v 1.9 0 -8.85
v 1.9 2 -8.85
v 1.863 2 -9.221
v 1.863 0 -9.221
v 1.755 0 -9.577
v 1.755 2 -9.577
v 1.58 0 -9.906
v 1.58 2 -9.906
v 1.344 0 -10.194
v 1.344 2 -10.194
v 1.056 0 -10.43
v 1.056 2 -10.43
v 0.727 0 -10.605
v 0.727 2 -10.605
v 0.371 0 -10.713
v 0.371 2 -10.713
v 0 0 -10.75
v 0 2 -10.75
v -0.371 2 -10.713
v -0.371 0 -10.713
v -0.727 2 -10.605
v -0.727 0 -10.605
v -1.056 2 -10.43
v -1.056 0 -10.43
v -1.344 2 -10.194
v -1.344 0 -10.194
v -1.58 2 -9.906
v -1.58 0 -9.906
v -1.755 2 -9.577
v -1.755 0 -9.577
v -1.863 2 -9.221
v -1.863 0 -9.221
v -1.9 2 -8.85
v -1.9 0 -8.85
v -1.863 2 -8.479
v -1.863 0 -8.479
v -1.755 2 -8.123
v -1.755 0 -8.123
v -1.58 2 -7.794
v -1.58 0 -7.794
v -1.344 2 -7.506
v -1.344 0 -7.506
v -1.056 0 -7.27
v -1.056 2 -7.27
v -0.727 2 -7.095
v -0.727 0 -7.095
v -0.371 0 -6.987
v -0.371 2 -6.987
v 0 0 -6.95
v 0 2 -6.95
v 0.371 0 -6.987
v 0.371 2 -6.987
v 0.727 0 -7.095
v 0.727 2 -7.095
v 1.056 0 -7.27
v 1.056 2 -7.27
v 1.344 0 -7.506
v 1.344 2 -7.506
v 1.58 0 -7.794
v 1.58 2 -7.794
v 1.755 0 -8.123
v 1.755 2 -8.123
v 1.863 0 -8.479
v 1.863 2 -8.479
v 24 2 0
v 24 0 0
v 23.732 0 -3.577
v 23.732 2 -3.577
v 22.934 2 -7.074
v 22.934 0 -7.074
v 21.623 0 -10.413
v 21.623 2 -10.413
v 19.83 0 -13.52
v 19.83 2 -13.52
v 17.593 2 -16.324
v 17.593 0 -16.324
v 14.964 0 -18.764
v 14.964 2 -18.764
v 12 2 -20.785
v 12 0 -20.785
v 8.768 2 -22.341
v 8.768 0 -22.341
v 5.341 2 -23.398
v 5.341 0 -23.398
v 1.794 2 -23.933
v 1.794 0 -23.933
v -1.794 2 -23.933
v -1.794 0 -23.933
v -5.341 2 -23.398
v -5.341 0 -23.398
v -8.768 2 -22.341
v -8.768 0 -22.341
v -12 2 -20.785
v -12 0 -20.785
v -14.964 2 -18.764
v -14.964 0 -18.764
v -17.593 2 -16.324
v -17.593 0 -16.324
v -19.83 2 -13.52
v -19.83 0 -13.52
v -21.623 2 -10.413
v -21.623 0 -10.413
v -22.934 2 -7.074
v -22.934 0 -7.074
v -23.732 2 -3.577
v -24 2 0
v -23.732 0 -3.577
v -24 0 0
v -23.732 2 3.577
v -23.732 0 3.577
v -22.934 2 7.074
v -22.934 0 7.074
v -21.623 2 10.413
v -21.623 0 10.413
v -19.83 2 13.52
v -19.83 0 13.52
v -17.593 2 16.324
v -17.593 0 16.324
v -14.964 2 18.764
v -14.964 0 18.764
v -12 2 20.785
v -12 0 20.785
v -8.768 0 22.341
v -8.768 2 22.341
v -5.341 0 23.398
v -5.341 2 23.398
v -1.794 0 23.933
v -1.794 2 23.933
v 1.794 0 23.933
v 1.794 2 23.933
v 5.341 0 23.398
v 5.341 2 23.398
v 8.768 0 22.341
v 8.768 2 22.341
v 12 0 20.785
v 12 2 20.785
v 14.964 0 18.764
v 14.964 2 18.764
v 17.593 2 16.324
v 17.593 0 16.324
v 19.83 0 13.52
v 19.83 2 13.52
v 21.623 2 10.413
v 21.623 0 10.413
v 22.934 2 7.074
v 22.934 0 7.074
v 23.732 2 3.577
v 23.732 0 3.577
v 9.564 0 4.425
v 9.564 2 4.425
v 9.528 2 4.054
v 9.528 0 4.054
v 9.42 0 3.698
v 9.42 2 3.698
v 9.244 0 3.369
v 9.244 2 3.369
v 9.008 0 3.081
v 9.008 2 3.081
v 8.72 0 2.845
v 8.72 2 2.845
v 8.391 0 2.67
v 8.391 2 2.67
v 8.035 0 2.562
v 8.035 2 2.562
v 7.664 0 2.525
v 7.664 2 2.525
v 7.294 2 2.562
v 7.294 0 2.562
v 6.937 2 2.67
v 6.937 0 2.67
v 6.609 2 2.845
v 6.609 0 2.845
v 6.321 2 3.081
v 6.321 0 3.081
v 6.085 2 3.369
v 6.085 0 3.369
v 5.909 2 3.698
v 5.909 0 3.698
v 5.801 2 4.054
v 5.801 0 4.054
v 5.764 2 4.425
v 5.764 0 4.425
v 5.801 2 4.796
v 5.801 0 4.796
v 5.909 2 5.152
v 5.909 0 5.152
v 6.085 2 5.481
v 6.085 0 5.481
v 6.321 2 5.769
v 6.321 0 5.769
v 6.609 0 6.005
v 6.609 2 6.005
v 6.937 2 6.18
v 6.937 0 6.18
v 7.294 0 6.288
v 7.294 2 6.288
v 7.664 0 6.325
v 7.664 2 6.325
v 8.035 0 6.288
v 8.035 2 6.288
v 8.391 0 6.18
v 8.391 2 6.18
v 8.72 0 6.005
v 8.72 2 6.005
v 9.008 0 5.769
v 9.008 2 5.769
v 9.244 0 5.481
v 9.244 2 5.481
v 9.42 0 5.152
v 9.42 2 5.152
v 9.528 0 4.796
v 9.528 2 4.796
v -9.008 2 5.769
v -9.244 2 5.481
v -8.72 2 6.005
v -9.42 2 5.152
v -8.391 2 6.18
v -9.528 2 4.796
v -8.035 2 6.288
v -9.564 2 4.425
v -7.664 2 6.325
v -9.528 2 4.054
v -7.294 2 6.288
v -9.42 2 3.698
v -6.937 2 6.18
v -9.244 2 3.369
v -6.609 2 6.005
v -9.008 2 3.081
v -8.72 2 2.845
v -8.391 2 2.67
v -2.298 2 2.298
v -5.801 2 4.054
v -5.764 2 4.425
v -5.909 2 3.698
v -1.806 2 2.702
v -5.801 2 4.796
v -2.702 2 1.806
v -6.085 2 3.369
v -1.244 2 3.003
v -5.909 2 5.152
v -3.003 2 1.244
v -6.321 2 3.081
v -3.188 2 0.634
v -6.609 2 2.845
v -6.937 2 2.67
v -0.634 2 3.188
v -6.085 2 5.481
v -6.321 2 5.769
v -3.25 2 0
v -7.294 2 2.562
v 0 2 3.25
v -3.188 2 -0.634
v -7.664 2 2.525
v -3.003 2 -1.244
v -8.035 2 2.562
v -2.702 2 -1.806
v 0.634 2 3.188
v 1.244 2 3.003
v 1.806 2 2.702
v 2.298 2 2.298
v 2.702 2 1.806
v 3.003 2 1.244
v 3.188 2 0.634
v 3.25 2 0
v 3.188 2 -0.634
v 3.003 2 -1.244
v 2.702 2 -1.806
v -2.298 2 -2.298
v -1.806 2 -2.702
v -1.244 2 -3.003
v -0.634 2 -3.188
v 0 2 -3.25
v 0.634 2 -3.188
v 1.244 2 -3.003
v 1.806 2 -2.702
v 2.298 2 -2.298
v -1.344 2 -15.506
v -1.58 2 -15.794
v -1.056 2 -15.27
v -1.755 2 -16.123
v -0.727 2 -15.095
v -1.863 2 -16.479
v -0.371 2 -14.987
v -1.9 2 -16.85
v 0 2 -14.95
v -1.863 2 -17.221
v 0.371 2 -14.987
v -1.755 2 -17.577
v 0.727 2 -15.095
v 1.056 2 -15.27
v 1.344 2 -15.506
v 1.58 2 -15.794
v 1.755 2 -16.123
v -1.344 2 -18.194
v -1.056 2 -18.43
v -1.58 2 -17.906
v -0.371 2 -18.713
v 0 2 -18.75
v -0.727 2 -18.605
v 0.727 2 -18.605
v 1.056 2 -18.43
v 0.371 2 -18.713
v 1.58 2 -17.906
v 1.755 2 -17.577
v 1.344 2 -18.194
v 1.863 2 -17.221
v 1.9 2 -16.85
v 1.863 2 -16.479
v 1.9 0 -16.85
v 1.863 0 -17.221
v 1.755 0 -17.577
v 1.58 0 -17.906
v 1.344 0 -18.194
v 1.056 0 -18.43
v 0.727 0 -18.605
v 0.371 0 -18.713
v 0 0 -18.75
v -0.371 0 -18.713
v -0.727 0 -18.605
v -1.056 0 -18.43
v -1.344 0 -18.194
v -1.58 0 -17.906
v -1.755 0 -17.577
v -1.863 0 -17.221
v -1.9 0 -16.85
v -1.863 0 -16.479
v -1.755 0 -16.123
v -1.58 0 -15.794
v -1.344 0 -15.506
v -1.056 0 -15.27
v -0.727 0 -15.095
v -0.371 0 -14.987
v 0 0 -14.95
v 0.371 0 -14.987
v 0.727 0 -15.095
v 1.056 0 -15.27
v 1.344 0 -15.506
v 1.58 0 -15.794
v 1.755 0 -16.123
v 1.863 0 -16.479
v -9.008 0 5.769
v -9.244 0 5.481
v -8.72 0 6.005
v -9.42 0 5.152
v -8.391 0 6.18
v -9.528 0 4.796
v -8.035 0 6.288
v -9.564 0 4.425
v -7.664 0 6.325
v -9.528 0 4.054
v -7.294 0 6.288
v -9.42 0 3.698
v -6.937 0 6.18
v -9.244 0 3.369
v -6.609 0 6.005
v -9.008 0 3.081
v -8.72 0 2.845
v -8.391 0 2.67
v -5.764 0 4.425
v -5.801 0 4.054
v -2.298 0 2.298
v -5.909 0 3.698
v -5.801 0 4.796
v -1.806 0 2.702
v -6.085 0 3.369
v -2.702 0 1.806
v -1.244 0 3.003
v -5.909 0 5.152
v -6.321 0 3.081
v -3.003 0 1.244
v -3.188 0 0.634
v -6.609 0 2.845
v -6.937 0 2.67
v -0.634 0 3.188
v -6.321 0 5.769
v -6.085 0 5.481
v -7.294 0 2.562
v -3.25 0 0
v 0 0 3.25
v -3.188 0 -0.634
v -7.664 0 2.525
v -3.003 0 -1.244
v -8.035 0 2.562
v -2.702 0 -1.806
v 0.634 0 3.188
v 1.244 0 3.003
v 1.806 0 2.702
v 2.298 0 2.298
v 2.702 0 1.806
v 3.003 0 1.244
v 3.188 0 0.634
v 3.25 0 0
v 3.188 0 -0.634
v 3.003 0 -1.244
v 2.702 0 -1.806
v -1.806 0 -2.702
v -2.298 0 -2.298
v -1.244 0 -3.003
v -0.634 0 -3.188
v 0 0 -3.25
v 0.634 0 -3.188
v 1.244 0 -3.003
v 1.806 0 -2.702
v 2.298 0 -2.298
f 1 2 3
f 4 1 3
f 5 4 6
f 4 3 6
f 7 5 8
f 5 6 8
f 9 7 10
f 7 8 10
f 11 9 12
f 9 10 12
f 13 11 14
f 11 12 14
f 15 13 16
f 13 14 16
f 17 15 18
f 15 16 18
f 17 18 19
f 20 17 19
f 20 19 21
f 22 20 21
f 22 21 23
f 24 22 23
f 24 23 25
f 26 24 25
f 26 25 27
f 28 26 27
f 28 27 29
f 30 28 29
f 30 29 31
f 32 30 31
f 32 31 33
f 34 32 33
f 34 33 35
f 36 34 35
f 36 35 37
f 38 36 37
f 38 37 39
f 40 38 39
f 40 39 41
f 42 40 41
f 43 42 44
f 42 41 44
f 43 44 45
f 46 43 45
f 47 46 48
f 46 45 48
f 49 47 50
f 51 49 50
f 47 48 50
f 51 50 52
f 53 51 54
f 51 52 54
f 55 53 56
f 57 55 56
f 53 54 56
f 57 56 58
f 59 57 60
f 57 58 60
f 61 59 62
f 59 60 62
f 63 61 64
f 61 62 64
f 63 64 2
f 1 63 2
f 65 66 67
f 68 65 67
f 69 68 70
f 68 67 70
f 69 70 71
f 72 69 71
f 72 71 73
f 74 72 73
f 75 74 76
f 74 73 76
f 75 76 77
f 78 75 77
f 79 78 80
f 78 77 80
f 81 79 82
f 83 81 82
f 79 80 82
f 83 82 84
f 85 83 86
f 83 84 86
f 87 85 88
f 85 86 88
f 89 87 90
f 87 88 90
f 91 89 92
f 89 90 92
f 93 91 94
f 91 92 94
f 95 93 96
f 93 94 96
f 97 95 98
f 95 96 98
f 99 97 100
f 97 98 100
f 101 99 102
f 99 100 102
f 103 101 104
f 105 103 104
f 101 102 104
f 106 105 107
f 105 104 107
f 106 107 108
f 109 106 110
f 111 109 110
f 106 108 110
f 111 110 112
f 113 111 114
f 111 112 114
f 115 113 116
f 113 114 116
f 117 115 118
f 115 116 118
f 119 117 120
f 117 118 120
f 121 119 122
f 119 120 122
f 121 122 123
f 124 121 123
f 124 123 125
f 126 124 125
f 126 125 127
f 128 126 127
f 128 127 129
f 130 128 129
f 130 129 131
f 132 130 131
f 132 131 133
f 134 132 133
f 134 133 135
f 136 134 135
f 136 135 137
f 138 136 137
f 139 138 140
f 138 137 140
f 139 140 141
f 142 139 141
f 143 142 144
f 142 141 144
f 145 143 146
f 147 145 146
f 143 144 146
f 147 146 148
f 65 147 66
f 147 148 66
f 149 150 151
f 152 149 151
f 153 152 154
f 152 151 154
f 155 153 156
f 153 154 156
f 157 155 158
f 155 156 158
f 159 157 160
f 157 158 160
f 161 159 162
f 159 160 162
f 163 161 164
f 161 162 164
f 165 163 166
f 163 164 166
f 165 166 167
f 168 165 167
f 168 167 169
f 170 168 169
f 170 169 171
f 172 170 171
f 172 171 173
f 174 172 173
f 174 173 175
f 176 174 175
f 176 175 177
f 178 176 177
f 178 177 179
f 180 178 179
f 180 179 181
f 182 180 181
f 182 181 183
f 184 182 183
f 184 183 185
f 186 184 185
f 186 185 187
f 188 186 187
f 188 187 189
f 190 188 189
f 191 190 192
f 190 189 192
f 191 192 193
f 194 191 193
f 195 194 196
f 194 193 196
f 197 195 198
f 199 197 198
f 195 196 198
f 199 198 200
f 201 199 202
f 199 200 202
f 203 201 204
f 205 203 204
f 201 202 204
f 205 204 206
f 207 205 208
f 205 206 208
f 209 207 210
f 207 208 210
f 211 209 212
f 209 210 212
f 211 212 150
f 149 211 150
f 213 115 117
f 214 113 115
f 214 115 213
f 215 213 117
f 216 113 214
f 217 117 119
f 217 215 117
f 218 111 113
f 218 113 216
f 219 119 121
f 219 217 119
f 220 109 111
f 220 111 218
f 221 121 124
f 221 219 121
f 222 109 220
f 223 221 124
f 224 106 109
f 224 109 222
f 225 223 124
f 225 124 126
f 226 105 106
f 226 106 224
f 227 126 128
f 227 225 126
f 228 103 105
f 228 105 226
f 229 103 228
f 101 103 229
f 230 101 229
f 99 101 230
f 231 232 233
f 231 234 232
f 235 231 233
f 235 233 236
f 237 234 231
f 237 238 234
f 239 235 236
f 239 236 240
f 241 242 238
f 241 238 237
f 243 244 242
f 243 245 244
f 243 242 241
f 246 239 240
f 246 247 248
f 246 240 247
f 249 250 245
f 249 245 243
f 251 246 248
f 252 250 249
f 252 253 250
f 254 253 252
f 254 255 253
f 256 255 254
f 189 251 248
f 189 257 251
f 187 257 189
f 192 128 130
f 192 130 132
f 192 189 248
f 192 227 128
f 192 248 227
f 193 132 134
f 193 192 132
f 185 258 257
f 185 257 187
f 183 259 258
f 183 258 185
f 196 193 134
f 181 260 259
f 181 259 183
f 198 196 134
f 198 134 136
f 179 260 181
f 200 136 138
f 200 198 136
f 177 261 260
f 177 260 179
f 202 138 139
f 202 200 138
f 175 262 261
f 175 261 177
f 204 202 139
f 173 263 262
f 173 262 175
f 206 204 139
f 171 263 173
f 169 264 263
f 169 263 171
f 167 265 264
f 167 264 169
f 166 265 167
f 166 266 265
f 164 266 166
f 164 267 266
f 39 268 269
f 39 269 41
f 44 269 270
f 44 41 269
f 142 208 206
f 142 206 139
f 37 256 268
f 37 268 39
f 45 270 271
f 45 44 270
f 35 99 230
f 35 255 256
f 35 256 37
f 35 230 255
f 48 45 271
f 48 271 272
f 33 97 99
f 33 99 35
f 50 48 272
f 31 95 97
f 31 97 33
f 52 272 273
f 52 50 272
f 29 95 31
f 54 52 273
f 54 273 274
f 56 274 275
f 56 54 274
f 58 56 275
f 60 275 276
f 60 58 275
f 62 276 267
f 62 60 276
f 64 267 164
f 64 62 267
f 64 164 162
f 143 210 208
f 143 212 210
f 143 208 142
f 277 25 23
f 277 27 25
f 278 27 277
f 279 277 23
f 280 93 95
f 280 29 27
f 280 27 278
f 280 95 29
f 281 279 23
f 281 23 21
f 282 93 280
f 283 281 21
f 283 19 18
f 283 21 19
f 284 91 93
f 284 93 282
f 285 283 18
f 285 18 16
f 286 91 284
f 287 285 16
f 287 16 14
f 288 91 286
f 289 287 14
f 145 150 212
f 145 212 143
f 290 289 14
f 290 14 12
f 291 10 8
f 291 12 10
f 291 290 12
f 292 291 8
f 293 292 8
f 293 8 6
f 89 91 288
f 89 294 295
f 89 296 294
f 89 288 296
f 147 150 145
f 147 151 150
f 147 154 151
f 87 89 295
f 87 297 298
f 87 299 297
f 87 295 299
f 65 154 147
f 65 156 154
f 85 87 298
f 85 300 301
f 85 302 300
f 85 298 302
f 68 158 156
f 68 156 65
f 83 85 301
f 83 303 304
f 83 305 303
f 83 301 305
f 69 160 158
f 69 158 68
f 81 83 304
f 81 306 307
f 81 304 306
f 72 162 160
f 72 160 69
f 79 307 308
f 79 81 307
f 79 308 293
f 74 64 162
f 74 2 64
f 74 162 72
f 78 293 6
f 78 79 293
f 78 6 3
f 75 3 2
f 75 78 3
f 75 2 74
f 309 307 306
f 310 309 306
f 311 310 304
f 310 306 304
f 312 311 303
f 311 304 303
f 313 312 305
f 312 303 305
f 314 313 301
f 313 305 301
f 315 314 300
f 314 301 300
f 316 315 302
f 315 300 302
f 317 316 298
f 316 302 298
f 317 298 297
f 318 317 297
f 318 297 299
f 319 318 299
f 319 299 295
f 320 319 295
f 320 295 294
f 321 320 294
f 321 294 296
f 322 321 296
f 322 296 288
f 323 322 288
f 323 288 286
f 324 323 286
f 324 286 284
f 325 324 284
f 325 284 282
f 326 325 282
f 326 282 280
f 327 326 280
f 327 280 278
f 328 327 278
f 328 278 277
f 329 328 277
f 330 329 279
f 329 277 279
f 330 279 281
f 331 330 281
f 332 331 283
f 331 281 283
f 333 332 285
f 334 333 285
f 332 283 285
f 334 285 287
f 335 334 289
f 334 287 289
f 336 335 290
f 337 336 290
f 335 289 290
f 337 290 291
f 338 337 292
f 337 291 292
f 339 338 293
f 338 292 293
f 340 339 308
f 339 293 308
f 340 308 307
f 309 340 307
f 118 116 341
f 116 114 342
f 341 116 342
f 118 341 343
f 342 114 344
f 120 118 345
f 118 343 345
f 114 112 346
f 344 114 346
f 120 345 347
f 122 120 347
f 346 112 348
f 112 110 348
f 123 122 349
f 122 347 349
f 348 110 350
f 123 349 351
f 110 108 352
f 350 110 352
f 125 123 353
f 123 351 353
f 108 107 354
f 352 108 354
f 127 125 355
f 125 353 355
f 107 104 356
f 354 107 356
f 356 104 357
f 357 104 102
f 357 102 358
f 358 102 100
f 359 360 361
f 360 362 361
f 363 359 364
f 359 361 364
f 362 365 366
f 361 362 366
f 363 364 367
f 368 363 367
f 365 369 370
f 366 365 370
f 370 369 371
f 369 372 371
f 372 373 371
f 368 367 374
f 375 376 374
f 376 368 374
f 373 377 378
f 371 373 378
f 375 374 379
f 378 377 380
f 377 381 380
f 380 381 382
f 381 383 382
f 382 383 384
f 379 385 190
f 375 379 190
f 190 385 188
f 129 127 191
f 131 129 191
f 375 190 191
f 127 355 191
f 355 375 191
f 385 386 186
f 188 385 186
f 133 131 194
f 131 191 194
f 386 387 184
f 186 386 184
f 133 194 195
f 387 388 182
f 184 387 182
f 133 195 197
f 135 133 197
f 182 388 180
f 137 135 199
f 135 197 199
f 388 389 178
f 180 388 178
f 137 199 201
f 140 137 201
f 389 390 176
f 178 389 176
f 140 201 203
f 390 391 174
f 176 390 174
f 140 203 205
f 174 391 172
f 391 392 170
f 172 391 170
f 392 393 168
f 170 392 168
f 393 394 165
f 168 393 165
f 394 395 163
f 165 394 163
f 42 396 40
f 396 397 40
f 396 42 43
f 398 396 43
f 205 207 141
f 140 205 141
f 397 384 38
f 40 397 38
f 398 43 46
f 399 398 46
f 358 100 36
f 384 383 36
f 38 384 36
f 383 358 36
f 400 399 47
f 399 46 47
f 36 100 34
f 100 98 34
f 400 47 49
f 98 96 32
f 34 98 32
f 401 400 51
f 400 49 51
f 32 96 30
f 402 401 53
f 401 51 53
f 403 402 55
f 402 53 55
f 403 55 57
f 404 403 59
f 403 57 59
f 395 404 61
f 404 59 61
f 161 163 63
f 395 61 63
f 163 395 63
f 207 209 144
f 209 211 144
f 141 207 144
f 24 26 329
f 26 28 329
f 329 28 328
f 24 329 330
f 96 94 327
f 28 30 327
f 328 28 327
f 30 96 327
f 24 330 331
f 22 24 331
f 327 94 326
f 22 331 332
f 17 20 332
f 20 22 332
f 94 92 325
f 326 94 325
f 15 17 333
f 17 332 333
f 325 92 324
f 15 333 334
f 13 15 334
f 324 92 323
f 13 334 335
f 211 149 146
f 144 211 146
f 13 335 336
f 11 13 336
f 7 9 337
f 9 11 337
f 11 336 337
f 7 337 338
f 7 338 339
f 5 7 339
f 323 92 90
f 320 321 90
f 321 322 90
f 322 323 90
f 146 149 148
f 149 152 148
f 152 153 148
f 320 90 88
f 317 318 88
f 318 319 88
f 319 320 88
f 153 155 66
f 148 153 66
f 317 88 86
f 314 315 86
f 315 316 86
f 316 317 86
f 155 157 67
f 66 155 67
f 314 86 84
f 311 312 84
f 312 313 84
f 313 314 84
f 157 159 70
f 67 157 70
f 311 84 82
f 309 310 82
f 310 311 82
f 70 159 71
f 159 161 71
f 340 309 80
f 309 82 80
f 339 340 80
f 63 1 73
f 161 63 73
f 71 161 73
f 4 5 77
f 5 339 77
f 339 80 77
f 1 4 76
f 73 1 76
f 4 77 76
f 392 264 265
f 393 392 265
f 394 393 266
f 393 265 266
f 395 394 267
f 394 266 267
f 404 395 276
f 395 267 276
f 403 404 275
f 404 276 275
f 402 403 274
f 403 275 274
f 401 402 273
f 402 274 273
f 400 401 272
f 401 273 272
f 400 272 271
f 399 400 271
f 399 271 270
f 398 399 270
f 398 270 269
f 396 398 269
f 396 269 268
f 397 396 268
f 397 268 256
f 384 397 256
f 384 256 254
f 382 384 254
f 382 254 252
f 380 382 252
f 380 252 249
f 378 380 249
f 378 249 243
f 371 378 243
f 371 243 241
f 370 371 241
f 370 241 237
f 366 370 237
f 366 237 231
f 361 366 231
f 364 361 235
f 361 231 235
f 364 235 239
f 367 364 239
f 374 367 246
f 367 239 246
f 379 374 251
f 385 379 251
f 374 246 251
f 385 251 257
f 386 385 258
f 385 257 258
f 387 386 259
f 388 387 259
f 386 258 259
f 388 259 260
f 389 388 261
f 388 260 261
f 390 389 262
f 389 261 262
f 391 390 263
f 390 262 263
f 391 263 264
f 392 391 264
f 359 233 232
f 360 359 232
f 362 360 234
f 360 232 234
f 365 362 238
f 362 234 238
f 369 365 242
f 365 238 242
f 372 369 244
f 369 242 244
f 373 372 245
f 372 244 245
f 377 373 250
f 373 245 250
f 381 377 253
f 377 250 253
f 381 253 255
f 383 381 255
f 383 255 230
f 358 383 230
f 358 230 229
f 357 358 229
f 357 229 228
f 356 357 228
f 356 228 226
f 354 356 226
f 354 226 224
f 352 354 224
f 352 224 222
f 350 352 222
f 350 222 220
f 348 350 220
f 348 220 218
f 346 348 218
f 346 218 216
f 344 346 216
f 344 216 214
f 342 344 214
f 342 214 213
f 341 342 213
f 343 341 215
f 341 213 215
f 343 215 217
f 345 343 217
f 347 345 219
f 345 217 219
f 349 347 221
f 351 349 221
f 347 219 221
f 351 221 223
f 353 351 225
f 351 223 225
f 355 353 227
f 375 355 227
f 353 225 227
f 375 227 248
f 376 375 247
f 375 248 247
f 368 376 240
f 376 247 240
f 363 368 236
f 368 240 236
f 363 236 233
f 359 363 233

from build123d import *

# Parameters (mm, degrees)
SKETCH1_R           = 24
BOSS_EXTRUDE1_DEPTH = 2
SKETCH2_R           = 3.25
SKETCH2_R_2         = 1.9
CUT_EXTRUDE1_DEPTH  = 3


with BuildPart() as part:
    # Sketch1 → Boss-Extrude1 (new body)
    with BuildSketch(Plane(origin=(0, 0, 0), x_dir=(1, 0, 0), z_dir=(0, 1, 0))):
        Circle(SKETCH1_R)
    extrude(amount=BOSS_EXTRUDE1_DEPTH)

    # Sketch2 → Cut-Extrude1 (cut, through all)
    with BuildSketch(Plane(origin=(0, 2, 0), x_dir=(1, 0, 0), z_dir=(0, 1, 0))):
        Circle(SKETCH2_R)
        with Locations((0, 8.85)):
            Circle(SKETCH2_R_2)
        with Locations((7.664324823, -4.425)):
            Circle(SKETCH2_R_2)
        with Locations((-7.664324823, -4.425)):
            Circle(SKETCH2_R_2)
        with Locations((0, 16.85)):
            Circle(SKETCH2_R_2)
    extrude(amount=-CUT_EXTRUDE1_DEPTH, mode=Mode.SUBTRACT)


solid = part.part
